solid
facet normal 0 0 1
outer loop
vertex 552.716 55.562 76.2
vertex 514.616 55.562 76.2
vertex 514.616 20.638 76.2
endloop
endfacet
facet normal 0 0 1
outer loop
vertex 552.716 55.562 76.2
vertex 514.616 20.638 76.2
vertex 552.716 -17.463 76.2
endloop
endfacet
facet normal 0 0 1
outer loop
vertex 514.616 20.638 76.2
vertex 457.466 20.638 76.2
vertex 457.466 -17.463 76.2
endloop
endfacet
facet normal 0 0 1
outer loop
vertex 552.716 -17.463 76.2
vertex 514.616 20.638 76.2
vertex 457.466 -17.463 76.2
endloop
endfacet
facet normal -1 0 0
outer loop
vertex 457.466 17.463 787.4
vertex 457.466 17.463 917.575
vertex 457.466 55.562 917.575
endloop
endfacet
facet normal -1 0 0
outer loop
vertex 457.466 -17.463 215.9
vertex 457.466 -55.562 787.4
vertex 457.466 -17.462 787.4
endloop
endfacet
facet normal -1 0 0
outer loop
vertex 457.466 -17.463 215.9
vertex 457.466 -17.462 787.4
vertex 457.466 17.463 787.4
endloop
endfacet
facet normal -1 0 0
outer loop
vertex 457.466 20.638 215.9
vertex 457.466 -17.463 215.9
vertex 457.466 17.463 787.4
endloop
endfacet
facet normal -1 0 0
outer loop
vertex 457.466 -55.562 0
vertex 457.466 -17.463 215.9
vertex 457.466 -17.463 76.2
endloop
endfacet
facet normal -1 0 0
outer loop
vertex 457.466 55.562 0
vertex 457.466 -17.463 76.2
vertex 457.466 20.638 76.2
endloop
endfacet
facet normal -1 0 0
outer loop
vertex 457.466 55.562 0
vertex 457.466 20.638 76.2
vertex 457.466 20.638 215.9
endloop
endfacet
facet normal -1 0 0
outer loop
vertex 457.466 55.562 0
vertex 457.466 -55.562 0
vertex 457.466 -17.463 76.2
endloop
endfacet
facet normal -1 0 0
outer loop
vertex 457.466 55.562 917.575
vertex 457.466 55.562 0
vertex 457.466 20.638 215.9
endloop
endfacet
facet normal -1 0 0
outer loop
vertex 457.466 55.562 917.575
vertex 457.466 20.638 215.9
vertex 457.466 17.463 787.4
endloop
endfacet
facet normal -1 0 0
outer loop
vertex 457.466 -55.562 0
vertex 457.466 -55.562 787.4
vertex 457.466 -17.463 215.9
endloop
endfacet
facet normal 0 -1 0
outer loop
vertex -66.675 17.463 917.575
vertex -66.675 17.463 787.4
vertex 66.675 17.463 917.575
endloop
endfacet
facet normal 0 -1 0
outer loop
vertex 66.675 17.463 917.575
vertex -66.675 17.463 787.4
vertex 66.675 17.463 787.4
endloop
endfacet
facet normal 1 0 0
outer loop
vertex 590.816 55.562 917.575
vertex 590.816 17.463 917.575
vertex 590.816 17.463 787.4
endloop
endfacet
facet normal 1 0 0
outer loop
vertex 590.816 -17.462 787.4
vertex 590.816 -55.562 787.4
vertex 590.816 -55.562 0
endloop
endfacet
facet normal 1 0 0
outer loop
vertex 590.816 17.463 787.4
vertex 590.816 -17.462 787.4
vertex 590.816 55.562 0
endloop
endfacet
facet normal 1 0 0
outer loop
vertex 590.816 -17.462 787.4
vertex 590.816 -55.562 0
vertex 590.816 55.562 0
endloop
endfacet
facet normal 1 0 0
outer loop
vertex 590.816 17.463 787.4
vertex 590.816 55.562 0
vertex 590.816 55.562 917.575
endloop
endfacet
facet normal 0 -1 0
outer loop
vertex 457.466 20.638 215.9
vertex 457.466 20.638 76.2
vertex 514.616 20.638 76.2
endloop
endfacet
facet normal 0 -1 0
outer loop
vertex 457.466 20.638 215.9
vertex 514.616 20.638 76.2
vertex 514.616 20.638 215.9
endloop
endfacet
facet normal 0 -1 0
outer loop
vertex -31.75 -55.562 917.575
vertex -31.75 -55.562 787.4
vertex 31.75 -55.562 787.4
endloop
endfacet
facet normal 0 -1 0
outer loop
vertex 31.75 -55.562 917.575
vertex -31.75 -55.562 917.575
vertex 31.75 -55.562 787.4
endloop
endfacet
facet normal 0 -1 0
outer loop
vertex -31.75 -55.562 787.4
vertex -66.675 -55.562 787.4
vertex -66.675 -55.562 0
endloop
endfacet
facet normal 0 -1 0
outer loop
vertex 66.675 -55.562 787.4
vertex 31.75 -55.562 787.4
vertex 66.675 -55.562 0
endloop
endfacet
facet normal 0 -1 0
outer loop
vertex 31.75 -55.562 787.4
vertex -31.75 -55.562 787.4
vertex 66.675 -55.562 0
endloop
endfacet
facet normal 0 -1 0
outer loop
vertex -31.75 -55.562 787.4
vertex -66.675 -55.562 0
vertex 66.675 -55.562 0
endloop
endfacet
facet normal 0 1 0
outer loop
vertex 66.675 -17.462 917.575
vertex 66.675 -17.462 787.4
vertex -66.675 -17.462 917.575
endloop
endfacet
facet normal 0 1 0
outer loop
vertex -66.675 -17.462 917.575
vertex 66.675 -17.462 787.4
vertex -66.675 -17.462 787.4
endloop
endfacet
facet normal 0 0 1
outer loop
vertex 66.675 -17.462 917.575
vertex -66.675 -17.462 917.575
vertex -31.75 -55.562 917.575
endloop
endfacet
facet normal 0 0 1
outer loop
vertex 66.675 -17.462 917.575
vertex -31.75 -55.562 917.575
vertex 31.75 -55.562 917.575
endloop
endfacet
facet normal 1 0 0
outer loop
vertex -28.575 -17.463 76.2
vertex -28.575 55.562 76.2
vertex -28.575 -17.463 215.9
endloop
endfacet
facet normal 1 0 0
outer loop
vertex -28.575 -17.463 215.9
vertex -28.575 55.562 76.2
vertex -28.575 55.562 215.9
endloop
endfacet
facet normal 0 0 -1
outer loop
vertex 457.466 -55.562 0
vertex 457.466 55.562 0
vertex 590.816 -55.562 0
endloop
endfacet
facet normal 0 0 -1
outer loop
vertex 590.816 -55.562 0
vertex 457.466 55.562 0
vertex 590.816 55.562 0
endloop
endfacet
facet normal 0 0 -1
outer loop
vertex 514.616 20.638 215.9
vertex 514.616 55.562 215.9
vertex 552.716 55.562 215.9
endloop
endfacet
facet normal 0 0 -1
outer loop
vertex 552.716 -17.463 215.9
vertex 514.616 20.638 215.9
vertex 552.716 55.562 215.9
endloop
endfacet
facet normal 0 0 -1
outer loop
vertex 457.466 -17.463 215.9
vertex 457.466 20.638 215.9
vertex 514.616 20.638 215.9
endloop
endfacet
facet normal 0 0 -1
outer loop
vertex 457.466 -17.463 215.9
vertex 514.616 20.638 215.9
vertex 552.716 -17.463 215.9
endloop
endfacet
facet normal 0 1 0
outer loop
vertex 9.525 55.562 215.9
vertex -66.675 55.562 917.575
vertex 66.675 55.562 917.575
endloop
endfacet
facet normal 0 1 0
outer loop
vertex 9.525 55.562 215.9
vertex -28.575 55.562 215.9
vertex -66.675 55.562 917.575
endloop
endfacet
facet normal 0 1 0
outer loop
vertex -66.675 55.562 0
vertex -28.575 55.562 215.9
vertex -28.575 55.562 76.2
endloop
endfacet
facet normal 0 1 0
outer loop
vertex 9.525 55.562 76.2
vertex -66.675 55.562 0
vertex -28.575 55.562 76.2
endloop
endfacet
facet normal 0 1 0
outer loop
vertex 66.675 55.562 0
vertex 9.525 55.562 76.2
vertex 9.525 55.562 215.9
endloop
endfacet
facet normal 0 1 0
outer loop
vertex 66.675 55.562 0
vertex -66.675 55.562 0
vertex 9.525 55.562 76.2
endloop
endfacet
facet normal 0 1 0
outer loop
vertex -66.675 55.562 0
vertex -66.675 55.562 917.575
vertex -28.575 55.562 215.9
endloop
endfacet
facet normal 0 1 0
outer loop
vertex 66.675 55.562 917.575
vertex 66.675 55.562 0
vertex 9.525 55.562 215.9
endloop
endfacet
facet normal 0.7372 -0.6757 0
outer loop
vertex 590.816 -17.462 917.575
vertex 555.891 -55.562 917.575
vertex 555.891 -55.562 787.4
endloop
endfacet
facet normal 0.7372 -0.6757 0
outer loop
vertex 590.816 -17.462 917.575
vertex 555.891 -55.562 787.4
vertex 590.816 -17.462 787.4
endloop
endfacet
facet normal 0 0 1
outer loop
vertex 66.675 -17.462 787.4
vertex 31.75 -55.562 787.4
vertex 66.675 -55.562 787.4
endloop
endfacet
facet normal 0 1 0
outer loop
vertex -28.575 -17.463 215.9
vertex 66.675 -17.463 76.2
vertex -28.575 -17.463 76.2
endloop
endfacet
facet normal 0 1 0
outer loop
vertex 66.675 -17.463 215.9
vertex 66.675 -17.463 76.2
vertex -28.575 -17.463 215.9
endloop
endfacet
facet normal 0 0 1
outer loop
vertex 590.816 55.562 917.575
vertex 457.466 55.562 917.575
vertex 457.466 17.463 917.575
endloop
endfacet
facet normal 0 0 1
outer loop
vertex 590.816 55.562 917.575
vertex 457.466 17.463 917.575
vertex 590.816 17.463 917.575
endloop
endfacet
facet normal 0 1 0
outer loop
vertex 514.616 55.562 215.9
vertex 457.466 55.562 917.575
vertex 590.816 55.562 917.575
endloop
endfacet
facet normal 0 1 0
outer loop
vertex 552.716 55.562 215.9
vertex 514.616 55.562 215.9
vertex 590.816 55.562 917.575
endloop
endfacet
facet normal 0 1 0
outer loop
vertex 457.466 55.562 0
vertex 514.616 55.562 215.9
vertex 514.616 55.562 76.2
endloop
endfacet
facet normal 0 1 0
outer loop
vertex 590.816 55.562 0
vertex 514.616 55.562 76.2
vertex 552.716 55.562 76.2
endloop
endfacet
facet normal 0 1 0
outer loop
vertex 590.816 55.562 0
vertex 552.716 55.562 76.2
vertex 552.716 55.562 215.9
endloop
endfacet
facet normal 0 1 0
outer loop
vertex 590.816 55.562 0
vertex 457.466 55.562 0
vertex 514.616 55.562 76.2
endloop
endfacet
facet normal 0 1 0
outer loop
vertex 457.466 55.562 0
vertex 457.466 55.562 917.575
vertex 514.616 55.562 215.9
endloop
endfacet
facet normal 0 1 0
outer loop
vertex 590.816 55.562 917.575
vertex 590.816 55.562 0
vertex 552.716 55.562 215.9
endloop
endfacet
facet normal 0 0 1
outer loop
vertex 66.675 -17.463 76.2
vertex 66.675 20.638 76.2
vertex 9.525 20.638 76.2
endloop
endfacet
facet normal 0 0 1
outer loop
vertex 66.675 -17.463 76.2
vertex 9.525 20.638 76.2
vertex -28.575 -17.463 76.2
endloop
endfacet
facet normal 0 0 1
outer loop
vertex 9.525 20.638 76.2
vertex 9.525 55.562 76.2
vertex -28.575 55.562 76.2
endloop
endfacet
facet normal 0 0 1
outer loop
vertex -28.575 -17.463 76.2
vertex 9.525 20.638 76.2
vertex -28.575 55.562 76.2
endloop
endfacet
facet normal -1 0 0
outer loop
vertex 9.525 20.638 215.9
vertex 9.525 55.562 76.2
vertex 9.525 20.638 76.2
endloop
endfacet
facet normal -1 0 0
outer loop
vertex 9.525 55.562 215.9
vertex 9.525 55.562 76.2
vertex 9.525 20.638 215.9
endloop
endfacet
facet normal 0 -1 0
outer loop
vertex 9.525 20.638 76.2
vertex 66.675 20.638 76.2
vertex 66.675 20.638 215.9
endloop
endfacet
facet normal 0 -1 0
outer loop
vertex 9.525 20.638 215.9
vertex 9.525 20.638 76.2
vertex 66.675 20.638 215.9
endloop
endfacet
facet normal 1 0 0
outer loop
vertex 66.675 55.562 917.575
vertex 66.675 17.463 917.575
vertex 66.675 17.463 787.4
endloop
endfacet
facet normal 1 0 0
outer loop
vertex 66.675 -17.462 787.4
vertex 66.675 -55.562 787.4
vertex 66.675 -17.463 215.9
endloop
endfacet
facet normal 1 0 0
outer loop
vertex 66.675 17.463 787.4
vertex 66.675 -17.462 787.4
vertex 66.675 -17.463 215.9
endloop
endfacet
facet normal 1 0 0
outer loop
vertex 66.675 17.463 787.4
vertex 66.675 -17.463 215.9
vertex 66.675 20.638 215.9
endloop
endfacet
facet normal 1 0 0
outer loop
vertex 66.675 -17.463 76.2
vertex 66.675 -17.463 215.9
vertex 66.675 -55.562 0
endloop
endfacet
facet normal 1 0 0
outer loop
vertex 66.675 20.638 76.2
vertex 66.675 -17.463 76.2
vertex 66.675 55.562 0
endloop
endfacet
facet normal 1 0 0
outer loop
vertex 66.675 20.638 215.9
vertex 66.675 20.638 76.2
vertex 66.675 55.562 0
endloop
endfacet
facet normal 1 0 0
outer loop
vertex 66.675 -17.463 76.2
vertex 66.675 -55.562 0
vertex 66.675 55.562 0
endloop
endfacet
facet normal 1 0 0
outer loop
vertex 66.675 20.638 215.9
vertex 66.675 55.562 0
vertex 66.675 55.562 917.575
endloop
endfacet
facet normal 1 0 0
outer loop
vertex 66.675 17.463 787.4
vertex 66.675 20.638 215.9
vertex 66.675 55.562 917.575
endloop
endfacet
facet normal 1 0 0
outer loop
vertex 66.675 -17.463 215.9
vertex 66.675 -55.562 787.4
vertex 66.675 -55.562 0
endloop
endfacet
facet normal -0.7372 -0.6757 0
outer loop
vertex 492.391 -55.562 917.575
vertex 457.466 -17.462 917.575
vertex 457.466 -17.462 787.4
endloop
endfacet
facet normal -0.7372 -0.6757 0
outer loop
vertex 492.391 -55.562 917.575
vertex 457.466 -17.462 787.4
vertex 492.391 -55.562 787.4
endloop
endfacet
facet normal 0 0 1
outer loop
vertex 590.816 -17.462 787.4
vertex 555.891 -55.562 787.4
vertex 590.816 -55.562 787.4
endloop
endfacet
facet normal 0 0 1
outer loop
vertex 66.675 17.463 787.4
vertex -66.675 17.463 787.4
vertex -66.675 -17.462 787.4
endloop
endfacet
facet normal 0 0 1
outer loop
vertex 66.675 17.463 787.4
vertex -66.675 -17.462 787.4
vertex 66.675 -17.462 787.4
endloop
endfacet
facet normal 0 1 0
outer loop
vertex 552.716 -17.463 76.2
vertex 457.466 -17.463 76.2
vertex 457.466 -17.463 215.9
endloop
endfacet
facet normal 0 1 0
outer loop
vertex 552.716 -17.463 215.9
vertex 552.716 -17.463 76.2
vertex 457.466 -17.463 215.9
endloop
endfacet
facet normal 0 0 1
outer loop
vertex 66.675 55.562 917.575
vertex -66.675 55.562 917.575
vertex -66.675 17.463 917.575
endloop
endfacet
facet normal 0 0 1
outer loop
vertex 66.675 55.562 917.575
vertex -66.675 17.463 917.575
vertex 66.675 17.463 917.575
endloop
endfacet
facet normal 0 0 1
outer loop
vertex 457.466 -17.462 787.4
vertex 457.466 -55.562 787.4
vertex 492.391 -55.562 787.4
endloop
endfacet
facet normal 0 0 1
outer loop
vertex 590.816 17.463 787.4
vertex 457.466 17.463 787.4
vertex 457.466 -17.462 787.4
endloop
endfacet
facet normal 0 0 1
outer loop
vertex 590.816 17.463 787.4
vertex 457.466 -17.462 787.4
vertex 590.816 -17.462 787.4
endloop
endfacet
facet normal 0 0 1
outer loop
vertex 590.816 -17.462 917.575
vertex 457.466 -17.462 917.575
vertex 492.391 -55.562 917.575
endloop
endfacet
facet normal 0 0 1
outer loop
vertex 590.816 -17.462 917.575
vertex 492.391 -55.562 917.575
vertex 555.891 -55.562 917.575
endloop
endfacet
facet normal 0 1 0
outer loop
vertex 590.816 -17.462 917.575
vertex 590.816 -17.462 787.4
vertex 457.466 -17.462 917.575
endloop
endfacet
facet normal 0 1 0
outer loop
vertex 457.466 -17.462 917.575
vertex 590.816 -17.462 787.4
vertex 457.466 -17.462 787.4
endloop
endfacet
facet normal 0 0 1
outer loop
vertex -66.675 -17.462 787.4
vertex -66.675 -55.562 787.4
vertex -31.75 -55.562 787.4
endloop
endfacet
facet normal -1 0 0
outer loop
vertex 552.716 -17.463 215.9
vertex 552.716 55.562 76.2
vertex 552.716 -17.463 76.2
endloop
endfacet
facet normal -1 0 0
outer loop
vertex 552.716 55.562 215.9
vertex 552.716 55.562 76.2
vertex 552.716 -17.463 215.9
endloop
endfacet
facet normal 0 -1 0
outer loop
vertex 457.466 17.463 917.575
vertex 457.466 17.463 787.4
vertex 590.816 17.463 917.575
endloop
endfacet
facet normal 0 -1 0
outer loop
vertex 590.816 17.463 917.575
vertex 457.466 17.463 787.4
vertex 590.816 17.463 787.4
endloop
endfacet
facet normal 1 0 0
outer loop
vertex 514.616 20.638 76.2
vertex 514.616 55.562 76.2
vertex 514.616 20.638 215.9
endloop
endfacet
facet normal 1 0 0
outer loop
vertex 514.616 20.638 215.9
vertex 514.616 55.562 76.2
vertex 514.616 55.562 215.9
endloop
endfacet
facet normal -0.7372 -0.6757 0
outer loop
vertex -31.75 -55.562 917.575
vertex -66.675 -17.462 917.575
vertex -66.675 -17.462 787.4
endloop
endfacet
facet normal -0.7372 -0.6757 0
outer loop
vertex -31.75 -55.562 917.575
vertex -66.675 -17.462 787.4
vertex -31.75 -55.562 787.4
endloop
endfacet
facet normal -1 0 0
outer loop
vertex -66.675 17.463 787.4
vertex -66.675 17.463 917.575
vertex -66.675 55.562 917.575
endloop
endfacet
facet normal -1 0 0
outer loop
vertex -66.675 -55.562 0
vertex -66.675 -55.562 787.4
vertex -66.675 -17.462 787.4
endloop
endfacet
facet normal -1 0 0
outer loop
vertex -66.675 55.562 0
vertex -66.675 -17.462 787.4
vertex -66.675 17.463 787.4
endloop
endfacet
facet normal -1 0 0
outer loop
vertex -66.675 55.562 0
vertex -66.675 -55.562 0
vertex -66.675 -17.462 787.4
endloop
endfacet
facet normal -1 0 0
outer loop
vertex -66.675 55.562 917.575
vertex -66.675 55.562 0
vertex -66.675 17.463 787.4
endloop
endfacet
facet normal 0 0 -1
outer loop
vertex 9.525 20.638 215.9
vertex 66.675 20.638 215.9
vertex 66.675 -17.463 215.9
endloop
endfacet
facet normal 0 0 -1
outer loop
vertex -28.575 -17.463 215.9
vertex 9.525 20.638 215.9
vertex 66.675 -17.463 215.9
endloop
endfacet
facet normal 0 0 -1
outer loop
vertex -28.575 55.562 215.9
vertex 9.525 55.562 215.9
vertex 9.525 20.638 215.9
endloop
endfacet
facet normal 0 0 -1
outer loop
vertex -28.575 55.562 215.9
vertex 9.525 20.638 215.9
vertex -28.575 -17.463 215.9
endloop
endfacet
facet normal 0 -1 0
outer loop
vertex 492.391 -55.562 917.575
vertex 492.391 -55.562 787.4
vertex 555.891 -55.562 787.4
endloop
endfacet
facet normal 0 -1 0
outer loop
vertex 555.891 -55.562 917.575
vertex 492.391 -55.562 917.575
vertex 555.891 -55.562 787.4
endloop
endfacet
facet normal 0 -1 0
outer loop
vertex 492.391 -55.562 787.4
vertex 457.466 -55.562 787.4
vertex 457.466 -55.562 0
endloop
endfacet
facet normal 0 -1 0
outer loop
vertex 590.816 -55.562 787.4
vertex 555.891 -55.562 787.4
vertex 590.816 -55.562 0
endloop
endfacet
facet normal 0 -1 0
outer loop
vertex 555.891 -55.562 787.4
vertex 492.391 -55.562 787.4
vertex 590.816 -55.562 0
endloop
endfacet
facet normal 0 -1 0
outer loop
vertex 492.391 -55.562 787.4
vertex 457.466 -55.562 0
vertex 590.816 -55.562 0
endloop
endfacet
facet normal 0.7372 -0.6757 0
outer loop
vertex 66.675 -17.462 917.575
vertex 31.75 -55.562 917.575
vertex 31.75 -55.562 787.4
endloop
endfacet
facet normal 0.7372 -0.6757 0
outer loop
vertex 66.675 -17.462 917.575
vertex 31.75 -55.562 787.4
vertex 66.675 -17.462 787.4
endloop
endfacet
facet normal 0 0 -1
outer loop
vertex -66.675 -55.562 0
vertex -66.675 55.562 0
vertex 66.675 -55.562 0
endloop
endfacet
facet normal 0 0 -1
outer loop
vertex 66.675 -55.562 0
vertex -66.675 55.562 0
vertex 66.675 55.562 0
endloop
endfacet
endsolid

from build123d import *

# Parameters (mm, degrees)
F0_W      = 133.35
F0_H      = 111.125
F1_DEPTH  = 787.4
F2_W      = 133.35
F2_H      = 38.1
F3_DEPTH  = 130.175
F5_W      = 38.1
F5_H      = 139.7
F6_DEPTH  = 95.25
F7_W      = 38.1
F7_H      = 139.7
F8_DEPTH  = 34.925
F10_W     = 38.1
F10_H     = 139.7
F11_DEPTH = 95.25
F9_W      = 38.1
F9_H      = 139.7
F12_DEPTH = 34.925


with BuildPart() as f1:
    # F0 (on Top) → F1 (new body)
    with BuildSketch(Plane.XY):
        Rectangle(F0_W, F0_H)
    extrude(amount=F1_DEPTH)

    # F2 (on face) → F3 (join)
    with BuildSketch(Plane.XY.offset(787.4)):
        with Locations((0, 36.5125)):
            Rectangle(F2_W, F2_H)
        Polygon((31.75, -55.5625), (66.675, -17.4625), (-66.675, -17.4625), (-31.75, -55.5625), align=None)
    extrude(amount=F3_DEPTH)


with BuildPart() as f4_1:
    # F4: copy of F1
    add(f1.part.moved(Location((524.14115, 0, 0))))

    # F10 (on face) → F11 (cut)
    with BuildSketch(Plane(origin=(457.46615, 0, 0), x_dir=(0, -1, 0), z_dir=(-1, 0, 0))):
        with Locations((-1.5875, 146.05)):
            Rectangle(F10_W, F10_H)
    extrude(amount=-F11_DEPTH, mode=Mode.SUBTRACT)

    # F9 (on face) → F12 (cut, through all)
    with BuildSketch(Plane(origin=(0, 55.5625, 0), x_dir=(-1, 0, 0), z_dir=(0, 1, 0))):
        with Locations((-533.66615, 146.05)):
            Rectangle(F9_W, F9_H)
    extrude(amount=-F12_DEPTH, mode=Mode.SUBTRACT)


with BuildPart() as f1_1:
    add(f1.part)

    # F5 (on face) → F6 (cut)
    with BuildSketch(Plane.YZ.offset(66.675)):
        with Locations((1.5875, 146.05)):
            Rectangle(F5_W, F5_H)
    extrude(amount=-F6_DEPTH, mode=Mode.SUBTRACT)

    # F7 (on face) → F8 (cut, through all)
    with BuildSketch(Plane(origin=(0, 55.5625, 0), x_dir=(-1, 0, 0), z_dir=(0, 1, 0))):
        with Locations((9.525, 146.05)):
            Rectangle(F7_W, F7_H)
    extrude(amount=-F8_DEPTH, mode=Mode.SUBTRACT)


solid = Compound([f4_1.part, f1_1.part])
